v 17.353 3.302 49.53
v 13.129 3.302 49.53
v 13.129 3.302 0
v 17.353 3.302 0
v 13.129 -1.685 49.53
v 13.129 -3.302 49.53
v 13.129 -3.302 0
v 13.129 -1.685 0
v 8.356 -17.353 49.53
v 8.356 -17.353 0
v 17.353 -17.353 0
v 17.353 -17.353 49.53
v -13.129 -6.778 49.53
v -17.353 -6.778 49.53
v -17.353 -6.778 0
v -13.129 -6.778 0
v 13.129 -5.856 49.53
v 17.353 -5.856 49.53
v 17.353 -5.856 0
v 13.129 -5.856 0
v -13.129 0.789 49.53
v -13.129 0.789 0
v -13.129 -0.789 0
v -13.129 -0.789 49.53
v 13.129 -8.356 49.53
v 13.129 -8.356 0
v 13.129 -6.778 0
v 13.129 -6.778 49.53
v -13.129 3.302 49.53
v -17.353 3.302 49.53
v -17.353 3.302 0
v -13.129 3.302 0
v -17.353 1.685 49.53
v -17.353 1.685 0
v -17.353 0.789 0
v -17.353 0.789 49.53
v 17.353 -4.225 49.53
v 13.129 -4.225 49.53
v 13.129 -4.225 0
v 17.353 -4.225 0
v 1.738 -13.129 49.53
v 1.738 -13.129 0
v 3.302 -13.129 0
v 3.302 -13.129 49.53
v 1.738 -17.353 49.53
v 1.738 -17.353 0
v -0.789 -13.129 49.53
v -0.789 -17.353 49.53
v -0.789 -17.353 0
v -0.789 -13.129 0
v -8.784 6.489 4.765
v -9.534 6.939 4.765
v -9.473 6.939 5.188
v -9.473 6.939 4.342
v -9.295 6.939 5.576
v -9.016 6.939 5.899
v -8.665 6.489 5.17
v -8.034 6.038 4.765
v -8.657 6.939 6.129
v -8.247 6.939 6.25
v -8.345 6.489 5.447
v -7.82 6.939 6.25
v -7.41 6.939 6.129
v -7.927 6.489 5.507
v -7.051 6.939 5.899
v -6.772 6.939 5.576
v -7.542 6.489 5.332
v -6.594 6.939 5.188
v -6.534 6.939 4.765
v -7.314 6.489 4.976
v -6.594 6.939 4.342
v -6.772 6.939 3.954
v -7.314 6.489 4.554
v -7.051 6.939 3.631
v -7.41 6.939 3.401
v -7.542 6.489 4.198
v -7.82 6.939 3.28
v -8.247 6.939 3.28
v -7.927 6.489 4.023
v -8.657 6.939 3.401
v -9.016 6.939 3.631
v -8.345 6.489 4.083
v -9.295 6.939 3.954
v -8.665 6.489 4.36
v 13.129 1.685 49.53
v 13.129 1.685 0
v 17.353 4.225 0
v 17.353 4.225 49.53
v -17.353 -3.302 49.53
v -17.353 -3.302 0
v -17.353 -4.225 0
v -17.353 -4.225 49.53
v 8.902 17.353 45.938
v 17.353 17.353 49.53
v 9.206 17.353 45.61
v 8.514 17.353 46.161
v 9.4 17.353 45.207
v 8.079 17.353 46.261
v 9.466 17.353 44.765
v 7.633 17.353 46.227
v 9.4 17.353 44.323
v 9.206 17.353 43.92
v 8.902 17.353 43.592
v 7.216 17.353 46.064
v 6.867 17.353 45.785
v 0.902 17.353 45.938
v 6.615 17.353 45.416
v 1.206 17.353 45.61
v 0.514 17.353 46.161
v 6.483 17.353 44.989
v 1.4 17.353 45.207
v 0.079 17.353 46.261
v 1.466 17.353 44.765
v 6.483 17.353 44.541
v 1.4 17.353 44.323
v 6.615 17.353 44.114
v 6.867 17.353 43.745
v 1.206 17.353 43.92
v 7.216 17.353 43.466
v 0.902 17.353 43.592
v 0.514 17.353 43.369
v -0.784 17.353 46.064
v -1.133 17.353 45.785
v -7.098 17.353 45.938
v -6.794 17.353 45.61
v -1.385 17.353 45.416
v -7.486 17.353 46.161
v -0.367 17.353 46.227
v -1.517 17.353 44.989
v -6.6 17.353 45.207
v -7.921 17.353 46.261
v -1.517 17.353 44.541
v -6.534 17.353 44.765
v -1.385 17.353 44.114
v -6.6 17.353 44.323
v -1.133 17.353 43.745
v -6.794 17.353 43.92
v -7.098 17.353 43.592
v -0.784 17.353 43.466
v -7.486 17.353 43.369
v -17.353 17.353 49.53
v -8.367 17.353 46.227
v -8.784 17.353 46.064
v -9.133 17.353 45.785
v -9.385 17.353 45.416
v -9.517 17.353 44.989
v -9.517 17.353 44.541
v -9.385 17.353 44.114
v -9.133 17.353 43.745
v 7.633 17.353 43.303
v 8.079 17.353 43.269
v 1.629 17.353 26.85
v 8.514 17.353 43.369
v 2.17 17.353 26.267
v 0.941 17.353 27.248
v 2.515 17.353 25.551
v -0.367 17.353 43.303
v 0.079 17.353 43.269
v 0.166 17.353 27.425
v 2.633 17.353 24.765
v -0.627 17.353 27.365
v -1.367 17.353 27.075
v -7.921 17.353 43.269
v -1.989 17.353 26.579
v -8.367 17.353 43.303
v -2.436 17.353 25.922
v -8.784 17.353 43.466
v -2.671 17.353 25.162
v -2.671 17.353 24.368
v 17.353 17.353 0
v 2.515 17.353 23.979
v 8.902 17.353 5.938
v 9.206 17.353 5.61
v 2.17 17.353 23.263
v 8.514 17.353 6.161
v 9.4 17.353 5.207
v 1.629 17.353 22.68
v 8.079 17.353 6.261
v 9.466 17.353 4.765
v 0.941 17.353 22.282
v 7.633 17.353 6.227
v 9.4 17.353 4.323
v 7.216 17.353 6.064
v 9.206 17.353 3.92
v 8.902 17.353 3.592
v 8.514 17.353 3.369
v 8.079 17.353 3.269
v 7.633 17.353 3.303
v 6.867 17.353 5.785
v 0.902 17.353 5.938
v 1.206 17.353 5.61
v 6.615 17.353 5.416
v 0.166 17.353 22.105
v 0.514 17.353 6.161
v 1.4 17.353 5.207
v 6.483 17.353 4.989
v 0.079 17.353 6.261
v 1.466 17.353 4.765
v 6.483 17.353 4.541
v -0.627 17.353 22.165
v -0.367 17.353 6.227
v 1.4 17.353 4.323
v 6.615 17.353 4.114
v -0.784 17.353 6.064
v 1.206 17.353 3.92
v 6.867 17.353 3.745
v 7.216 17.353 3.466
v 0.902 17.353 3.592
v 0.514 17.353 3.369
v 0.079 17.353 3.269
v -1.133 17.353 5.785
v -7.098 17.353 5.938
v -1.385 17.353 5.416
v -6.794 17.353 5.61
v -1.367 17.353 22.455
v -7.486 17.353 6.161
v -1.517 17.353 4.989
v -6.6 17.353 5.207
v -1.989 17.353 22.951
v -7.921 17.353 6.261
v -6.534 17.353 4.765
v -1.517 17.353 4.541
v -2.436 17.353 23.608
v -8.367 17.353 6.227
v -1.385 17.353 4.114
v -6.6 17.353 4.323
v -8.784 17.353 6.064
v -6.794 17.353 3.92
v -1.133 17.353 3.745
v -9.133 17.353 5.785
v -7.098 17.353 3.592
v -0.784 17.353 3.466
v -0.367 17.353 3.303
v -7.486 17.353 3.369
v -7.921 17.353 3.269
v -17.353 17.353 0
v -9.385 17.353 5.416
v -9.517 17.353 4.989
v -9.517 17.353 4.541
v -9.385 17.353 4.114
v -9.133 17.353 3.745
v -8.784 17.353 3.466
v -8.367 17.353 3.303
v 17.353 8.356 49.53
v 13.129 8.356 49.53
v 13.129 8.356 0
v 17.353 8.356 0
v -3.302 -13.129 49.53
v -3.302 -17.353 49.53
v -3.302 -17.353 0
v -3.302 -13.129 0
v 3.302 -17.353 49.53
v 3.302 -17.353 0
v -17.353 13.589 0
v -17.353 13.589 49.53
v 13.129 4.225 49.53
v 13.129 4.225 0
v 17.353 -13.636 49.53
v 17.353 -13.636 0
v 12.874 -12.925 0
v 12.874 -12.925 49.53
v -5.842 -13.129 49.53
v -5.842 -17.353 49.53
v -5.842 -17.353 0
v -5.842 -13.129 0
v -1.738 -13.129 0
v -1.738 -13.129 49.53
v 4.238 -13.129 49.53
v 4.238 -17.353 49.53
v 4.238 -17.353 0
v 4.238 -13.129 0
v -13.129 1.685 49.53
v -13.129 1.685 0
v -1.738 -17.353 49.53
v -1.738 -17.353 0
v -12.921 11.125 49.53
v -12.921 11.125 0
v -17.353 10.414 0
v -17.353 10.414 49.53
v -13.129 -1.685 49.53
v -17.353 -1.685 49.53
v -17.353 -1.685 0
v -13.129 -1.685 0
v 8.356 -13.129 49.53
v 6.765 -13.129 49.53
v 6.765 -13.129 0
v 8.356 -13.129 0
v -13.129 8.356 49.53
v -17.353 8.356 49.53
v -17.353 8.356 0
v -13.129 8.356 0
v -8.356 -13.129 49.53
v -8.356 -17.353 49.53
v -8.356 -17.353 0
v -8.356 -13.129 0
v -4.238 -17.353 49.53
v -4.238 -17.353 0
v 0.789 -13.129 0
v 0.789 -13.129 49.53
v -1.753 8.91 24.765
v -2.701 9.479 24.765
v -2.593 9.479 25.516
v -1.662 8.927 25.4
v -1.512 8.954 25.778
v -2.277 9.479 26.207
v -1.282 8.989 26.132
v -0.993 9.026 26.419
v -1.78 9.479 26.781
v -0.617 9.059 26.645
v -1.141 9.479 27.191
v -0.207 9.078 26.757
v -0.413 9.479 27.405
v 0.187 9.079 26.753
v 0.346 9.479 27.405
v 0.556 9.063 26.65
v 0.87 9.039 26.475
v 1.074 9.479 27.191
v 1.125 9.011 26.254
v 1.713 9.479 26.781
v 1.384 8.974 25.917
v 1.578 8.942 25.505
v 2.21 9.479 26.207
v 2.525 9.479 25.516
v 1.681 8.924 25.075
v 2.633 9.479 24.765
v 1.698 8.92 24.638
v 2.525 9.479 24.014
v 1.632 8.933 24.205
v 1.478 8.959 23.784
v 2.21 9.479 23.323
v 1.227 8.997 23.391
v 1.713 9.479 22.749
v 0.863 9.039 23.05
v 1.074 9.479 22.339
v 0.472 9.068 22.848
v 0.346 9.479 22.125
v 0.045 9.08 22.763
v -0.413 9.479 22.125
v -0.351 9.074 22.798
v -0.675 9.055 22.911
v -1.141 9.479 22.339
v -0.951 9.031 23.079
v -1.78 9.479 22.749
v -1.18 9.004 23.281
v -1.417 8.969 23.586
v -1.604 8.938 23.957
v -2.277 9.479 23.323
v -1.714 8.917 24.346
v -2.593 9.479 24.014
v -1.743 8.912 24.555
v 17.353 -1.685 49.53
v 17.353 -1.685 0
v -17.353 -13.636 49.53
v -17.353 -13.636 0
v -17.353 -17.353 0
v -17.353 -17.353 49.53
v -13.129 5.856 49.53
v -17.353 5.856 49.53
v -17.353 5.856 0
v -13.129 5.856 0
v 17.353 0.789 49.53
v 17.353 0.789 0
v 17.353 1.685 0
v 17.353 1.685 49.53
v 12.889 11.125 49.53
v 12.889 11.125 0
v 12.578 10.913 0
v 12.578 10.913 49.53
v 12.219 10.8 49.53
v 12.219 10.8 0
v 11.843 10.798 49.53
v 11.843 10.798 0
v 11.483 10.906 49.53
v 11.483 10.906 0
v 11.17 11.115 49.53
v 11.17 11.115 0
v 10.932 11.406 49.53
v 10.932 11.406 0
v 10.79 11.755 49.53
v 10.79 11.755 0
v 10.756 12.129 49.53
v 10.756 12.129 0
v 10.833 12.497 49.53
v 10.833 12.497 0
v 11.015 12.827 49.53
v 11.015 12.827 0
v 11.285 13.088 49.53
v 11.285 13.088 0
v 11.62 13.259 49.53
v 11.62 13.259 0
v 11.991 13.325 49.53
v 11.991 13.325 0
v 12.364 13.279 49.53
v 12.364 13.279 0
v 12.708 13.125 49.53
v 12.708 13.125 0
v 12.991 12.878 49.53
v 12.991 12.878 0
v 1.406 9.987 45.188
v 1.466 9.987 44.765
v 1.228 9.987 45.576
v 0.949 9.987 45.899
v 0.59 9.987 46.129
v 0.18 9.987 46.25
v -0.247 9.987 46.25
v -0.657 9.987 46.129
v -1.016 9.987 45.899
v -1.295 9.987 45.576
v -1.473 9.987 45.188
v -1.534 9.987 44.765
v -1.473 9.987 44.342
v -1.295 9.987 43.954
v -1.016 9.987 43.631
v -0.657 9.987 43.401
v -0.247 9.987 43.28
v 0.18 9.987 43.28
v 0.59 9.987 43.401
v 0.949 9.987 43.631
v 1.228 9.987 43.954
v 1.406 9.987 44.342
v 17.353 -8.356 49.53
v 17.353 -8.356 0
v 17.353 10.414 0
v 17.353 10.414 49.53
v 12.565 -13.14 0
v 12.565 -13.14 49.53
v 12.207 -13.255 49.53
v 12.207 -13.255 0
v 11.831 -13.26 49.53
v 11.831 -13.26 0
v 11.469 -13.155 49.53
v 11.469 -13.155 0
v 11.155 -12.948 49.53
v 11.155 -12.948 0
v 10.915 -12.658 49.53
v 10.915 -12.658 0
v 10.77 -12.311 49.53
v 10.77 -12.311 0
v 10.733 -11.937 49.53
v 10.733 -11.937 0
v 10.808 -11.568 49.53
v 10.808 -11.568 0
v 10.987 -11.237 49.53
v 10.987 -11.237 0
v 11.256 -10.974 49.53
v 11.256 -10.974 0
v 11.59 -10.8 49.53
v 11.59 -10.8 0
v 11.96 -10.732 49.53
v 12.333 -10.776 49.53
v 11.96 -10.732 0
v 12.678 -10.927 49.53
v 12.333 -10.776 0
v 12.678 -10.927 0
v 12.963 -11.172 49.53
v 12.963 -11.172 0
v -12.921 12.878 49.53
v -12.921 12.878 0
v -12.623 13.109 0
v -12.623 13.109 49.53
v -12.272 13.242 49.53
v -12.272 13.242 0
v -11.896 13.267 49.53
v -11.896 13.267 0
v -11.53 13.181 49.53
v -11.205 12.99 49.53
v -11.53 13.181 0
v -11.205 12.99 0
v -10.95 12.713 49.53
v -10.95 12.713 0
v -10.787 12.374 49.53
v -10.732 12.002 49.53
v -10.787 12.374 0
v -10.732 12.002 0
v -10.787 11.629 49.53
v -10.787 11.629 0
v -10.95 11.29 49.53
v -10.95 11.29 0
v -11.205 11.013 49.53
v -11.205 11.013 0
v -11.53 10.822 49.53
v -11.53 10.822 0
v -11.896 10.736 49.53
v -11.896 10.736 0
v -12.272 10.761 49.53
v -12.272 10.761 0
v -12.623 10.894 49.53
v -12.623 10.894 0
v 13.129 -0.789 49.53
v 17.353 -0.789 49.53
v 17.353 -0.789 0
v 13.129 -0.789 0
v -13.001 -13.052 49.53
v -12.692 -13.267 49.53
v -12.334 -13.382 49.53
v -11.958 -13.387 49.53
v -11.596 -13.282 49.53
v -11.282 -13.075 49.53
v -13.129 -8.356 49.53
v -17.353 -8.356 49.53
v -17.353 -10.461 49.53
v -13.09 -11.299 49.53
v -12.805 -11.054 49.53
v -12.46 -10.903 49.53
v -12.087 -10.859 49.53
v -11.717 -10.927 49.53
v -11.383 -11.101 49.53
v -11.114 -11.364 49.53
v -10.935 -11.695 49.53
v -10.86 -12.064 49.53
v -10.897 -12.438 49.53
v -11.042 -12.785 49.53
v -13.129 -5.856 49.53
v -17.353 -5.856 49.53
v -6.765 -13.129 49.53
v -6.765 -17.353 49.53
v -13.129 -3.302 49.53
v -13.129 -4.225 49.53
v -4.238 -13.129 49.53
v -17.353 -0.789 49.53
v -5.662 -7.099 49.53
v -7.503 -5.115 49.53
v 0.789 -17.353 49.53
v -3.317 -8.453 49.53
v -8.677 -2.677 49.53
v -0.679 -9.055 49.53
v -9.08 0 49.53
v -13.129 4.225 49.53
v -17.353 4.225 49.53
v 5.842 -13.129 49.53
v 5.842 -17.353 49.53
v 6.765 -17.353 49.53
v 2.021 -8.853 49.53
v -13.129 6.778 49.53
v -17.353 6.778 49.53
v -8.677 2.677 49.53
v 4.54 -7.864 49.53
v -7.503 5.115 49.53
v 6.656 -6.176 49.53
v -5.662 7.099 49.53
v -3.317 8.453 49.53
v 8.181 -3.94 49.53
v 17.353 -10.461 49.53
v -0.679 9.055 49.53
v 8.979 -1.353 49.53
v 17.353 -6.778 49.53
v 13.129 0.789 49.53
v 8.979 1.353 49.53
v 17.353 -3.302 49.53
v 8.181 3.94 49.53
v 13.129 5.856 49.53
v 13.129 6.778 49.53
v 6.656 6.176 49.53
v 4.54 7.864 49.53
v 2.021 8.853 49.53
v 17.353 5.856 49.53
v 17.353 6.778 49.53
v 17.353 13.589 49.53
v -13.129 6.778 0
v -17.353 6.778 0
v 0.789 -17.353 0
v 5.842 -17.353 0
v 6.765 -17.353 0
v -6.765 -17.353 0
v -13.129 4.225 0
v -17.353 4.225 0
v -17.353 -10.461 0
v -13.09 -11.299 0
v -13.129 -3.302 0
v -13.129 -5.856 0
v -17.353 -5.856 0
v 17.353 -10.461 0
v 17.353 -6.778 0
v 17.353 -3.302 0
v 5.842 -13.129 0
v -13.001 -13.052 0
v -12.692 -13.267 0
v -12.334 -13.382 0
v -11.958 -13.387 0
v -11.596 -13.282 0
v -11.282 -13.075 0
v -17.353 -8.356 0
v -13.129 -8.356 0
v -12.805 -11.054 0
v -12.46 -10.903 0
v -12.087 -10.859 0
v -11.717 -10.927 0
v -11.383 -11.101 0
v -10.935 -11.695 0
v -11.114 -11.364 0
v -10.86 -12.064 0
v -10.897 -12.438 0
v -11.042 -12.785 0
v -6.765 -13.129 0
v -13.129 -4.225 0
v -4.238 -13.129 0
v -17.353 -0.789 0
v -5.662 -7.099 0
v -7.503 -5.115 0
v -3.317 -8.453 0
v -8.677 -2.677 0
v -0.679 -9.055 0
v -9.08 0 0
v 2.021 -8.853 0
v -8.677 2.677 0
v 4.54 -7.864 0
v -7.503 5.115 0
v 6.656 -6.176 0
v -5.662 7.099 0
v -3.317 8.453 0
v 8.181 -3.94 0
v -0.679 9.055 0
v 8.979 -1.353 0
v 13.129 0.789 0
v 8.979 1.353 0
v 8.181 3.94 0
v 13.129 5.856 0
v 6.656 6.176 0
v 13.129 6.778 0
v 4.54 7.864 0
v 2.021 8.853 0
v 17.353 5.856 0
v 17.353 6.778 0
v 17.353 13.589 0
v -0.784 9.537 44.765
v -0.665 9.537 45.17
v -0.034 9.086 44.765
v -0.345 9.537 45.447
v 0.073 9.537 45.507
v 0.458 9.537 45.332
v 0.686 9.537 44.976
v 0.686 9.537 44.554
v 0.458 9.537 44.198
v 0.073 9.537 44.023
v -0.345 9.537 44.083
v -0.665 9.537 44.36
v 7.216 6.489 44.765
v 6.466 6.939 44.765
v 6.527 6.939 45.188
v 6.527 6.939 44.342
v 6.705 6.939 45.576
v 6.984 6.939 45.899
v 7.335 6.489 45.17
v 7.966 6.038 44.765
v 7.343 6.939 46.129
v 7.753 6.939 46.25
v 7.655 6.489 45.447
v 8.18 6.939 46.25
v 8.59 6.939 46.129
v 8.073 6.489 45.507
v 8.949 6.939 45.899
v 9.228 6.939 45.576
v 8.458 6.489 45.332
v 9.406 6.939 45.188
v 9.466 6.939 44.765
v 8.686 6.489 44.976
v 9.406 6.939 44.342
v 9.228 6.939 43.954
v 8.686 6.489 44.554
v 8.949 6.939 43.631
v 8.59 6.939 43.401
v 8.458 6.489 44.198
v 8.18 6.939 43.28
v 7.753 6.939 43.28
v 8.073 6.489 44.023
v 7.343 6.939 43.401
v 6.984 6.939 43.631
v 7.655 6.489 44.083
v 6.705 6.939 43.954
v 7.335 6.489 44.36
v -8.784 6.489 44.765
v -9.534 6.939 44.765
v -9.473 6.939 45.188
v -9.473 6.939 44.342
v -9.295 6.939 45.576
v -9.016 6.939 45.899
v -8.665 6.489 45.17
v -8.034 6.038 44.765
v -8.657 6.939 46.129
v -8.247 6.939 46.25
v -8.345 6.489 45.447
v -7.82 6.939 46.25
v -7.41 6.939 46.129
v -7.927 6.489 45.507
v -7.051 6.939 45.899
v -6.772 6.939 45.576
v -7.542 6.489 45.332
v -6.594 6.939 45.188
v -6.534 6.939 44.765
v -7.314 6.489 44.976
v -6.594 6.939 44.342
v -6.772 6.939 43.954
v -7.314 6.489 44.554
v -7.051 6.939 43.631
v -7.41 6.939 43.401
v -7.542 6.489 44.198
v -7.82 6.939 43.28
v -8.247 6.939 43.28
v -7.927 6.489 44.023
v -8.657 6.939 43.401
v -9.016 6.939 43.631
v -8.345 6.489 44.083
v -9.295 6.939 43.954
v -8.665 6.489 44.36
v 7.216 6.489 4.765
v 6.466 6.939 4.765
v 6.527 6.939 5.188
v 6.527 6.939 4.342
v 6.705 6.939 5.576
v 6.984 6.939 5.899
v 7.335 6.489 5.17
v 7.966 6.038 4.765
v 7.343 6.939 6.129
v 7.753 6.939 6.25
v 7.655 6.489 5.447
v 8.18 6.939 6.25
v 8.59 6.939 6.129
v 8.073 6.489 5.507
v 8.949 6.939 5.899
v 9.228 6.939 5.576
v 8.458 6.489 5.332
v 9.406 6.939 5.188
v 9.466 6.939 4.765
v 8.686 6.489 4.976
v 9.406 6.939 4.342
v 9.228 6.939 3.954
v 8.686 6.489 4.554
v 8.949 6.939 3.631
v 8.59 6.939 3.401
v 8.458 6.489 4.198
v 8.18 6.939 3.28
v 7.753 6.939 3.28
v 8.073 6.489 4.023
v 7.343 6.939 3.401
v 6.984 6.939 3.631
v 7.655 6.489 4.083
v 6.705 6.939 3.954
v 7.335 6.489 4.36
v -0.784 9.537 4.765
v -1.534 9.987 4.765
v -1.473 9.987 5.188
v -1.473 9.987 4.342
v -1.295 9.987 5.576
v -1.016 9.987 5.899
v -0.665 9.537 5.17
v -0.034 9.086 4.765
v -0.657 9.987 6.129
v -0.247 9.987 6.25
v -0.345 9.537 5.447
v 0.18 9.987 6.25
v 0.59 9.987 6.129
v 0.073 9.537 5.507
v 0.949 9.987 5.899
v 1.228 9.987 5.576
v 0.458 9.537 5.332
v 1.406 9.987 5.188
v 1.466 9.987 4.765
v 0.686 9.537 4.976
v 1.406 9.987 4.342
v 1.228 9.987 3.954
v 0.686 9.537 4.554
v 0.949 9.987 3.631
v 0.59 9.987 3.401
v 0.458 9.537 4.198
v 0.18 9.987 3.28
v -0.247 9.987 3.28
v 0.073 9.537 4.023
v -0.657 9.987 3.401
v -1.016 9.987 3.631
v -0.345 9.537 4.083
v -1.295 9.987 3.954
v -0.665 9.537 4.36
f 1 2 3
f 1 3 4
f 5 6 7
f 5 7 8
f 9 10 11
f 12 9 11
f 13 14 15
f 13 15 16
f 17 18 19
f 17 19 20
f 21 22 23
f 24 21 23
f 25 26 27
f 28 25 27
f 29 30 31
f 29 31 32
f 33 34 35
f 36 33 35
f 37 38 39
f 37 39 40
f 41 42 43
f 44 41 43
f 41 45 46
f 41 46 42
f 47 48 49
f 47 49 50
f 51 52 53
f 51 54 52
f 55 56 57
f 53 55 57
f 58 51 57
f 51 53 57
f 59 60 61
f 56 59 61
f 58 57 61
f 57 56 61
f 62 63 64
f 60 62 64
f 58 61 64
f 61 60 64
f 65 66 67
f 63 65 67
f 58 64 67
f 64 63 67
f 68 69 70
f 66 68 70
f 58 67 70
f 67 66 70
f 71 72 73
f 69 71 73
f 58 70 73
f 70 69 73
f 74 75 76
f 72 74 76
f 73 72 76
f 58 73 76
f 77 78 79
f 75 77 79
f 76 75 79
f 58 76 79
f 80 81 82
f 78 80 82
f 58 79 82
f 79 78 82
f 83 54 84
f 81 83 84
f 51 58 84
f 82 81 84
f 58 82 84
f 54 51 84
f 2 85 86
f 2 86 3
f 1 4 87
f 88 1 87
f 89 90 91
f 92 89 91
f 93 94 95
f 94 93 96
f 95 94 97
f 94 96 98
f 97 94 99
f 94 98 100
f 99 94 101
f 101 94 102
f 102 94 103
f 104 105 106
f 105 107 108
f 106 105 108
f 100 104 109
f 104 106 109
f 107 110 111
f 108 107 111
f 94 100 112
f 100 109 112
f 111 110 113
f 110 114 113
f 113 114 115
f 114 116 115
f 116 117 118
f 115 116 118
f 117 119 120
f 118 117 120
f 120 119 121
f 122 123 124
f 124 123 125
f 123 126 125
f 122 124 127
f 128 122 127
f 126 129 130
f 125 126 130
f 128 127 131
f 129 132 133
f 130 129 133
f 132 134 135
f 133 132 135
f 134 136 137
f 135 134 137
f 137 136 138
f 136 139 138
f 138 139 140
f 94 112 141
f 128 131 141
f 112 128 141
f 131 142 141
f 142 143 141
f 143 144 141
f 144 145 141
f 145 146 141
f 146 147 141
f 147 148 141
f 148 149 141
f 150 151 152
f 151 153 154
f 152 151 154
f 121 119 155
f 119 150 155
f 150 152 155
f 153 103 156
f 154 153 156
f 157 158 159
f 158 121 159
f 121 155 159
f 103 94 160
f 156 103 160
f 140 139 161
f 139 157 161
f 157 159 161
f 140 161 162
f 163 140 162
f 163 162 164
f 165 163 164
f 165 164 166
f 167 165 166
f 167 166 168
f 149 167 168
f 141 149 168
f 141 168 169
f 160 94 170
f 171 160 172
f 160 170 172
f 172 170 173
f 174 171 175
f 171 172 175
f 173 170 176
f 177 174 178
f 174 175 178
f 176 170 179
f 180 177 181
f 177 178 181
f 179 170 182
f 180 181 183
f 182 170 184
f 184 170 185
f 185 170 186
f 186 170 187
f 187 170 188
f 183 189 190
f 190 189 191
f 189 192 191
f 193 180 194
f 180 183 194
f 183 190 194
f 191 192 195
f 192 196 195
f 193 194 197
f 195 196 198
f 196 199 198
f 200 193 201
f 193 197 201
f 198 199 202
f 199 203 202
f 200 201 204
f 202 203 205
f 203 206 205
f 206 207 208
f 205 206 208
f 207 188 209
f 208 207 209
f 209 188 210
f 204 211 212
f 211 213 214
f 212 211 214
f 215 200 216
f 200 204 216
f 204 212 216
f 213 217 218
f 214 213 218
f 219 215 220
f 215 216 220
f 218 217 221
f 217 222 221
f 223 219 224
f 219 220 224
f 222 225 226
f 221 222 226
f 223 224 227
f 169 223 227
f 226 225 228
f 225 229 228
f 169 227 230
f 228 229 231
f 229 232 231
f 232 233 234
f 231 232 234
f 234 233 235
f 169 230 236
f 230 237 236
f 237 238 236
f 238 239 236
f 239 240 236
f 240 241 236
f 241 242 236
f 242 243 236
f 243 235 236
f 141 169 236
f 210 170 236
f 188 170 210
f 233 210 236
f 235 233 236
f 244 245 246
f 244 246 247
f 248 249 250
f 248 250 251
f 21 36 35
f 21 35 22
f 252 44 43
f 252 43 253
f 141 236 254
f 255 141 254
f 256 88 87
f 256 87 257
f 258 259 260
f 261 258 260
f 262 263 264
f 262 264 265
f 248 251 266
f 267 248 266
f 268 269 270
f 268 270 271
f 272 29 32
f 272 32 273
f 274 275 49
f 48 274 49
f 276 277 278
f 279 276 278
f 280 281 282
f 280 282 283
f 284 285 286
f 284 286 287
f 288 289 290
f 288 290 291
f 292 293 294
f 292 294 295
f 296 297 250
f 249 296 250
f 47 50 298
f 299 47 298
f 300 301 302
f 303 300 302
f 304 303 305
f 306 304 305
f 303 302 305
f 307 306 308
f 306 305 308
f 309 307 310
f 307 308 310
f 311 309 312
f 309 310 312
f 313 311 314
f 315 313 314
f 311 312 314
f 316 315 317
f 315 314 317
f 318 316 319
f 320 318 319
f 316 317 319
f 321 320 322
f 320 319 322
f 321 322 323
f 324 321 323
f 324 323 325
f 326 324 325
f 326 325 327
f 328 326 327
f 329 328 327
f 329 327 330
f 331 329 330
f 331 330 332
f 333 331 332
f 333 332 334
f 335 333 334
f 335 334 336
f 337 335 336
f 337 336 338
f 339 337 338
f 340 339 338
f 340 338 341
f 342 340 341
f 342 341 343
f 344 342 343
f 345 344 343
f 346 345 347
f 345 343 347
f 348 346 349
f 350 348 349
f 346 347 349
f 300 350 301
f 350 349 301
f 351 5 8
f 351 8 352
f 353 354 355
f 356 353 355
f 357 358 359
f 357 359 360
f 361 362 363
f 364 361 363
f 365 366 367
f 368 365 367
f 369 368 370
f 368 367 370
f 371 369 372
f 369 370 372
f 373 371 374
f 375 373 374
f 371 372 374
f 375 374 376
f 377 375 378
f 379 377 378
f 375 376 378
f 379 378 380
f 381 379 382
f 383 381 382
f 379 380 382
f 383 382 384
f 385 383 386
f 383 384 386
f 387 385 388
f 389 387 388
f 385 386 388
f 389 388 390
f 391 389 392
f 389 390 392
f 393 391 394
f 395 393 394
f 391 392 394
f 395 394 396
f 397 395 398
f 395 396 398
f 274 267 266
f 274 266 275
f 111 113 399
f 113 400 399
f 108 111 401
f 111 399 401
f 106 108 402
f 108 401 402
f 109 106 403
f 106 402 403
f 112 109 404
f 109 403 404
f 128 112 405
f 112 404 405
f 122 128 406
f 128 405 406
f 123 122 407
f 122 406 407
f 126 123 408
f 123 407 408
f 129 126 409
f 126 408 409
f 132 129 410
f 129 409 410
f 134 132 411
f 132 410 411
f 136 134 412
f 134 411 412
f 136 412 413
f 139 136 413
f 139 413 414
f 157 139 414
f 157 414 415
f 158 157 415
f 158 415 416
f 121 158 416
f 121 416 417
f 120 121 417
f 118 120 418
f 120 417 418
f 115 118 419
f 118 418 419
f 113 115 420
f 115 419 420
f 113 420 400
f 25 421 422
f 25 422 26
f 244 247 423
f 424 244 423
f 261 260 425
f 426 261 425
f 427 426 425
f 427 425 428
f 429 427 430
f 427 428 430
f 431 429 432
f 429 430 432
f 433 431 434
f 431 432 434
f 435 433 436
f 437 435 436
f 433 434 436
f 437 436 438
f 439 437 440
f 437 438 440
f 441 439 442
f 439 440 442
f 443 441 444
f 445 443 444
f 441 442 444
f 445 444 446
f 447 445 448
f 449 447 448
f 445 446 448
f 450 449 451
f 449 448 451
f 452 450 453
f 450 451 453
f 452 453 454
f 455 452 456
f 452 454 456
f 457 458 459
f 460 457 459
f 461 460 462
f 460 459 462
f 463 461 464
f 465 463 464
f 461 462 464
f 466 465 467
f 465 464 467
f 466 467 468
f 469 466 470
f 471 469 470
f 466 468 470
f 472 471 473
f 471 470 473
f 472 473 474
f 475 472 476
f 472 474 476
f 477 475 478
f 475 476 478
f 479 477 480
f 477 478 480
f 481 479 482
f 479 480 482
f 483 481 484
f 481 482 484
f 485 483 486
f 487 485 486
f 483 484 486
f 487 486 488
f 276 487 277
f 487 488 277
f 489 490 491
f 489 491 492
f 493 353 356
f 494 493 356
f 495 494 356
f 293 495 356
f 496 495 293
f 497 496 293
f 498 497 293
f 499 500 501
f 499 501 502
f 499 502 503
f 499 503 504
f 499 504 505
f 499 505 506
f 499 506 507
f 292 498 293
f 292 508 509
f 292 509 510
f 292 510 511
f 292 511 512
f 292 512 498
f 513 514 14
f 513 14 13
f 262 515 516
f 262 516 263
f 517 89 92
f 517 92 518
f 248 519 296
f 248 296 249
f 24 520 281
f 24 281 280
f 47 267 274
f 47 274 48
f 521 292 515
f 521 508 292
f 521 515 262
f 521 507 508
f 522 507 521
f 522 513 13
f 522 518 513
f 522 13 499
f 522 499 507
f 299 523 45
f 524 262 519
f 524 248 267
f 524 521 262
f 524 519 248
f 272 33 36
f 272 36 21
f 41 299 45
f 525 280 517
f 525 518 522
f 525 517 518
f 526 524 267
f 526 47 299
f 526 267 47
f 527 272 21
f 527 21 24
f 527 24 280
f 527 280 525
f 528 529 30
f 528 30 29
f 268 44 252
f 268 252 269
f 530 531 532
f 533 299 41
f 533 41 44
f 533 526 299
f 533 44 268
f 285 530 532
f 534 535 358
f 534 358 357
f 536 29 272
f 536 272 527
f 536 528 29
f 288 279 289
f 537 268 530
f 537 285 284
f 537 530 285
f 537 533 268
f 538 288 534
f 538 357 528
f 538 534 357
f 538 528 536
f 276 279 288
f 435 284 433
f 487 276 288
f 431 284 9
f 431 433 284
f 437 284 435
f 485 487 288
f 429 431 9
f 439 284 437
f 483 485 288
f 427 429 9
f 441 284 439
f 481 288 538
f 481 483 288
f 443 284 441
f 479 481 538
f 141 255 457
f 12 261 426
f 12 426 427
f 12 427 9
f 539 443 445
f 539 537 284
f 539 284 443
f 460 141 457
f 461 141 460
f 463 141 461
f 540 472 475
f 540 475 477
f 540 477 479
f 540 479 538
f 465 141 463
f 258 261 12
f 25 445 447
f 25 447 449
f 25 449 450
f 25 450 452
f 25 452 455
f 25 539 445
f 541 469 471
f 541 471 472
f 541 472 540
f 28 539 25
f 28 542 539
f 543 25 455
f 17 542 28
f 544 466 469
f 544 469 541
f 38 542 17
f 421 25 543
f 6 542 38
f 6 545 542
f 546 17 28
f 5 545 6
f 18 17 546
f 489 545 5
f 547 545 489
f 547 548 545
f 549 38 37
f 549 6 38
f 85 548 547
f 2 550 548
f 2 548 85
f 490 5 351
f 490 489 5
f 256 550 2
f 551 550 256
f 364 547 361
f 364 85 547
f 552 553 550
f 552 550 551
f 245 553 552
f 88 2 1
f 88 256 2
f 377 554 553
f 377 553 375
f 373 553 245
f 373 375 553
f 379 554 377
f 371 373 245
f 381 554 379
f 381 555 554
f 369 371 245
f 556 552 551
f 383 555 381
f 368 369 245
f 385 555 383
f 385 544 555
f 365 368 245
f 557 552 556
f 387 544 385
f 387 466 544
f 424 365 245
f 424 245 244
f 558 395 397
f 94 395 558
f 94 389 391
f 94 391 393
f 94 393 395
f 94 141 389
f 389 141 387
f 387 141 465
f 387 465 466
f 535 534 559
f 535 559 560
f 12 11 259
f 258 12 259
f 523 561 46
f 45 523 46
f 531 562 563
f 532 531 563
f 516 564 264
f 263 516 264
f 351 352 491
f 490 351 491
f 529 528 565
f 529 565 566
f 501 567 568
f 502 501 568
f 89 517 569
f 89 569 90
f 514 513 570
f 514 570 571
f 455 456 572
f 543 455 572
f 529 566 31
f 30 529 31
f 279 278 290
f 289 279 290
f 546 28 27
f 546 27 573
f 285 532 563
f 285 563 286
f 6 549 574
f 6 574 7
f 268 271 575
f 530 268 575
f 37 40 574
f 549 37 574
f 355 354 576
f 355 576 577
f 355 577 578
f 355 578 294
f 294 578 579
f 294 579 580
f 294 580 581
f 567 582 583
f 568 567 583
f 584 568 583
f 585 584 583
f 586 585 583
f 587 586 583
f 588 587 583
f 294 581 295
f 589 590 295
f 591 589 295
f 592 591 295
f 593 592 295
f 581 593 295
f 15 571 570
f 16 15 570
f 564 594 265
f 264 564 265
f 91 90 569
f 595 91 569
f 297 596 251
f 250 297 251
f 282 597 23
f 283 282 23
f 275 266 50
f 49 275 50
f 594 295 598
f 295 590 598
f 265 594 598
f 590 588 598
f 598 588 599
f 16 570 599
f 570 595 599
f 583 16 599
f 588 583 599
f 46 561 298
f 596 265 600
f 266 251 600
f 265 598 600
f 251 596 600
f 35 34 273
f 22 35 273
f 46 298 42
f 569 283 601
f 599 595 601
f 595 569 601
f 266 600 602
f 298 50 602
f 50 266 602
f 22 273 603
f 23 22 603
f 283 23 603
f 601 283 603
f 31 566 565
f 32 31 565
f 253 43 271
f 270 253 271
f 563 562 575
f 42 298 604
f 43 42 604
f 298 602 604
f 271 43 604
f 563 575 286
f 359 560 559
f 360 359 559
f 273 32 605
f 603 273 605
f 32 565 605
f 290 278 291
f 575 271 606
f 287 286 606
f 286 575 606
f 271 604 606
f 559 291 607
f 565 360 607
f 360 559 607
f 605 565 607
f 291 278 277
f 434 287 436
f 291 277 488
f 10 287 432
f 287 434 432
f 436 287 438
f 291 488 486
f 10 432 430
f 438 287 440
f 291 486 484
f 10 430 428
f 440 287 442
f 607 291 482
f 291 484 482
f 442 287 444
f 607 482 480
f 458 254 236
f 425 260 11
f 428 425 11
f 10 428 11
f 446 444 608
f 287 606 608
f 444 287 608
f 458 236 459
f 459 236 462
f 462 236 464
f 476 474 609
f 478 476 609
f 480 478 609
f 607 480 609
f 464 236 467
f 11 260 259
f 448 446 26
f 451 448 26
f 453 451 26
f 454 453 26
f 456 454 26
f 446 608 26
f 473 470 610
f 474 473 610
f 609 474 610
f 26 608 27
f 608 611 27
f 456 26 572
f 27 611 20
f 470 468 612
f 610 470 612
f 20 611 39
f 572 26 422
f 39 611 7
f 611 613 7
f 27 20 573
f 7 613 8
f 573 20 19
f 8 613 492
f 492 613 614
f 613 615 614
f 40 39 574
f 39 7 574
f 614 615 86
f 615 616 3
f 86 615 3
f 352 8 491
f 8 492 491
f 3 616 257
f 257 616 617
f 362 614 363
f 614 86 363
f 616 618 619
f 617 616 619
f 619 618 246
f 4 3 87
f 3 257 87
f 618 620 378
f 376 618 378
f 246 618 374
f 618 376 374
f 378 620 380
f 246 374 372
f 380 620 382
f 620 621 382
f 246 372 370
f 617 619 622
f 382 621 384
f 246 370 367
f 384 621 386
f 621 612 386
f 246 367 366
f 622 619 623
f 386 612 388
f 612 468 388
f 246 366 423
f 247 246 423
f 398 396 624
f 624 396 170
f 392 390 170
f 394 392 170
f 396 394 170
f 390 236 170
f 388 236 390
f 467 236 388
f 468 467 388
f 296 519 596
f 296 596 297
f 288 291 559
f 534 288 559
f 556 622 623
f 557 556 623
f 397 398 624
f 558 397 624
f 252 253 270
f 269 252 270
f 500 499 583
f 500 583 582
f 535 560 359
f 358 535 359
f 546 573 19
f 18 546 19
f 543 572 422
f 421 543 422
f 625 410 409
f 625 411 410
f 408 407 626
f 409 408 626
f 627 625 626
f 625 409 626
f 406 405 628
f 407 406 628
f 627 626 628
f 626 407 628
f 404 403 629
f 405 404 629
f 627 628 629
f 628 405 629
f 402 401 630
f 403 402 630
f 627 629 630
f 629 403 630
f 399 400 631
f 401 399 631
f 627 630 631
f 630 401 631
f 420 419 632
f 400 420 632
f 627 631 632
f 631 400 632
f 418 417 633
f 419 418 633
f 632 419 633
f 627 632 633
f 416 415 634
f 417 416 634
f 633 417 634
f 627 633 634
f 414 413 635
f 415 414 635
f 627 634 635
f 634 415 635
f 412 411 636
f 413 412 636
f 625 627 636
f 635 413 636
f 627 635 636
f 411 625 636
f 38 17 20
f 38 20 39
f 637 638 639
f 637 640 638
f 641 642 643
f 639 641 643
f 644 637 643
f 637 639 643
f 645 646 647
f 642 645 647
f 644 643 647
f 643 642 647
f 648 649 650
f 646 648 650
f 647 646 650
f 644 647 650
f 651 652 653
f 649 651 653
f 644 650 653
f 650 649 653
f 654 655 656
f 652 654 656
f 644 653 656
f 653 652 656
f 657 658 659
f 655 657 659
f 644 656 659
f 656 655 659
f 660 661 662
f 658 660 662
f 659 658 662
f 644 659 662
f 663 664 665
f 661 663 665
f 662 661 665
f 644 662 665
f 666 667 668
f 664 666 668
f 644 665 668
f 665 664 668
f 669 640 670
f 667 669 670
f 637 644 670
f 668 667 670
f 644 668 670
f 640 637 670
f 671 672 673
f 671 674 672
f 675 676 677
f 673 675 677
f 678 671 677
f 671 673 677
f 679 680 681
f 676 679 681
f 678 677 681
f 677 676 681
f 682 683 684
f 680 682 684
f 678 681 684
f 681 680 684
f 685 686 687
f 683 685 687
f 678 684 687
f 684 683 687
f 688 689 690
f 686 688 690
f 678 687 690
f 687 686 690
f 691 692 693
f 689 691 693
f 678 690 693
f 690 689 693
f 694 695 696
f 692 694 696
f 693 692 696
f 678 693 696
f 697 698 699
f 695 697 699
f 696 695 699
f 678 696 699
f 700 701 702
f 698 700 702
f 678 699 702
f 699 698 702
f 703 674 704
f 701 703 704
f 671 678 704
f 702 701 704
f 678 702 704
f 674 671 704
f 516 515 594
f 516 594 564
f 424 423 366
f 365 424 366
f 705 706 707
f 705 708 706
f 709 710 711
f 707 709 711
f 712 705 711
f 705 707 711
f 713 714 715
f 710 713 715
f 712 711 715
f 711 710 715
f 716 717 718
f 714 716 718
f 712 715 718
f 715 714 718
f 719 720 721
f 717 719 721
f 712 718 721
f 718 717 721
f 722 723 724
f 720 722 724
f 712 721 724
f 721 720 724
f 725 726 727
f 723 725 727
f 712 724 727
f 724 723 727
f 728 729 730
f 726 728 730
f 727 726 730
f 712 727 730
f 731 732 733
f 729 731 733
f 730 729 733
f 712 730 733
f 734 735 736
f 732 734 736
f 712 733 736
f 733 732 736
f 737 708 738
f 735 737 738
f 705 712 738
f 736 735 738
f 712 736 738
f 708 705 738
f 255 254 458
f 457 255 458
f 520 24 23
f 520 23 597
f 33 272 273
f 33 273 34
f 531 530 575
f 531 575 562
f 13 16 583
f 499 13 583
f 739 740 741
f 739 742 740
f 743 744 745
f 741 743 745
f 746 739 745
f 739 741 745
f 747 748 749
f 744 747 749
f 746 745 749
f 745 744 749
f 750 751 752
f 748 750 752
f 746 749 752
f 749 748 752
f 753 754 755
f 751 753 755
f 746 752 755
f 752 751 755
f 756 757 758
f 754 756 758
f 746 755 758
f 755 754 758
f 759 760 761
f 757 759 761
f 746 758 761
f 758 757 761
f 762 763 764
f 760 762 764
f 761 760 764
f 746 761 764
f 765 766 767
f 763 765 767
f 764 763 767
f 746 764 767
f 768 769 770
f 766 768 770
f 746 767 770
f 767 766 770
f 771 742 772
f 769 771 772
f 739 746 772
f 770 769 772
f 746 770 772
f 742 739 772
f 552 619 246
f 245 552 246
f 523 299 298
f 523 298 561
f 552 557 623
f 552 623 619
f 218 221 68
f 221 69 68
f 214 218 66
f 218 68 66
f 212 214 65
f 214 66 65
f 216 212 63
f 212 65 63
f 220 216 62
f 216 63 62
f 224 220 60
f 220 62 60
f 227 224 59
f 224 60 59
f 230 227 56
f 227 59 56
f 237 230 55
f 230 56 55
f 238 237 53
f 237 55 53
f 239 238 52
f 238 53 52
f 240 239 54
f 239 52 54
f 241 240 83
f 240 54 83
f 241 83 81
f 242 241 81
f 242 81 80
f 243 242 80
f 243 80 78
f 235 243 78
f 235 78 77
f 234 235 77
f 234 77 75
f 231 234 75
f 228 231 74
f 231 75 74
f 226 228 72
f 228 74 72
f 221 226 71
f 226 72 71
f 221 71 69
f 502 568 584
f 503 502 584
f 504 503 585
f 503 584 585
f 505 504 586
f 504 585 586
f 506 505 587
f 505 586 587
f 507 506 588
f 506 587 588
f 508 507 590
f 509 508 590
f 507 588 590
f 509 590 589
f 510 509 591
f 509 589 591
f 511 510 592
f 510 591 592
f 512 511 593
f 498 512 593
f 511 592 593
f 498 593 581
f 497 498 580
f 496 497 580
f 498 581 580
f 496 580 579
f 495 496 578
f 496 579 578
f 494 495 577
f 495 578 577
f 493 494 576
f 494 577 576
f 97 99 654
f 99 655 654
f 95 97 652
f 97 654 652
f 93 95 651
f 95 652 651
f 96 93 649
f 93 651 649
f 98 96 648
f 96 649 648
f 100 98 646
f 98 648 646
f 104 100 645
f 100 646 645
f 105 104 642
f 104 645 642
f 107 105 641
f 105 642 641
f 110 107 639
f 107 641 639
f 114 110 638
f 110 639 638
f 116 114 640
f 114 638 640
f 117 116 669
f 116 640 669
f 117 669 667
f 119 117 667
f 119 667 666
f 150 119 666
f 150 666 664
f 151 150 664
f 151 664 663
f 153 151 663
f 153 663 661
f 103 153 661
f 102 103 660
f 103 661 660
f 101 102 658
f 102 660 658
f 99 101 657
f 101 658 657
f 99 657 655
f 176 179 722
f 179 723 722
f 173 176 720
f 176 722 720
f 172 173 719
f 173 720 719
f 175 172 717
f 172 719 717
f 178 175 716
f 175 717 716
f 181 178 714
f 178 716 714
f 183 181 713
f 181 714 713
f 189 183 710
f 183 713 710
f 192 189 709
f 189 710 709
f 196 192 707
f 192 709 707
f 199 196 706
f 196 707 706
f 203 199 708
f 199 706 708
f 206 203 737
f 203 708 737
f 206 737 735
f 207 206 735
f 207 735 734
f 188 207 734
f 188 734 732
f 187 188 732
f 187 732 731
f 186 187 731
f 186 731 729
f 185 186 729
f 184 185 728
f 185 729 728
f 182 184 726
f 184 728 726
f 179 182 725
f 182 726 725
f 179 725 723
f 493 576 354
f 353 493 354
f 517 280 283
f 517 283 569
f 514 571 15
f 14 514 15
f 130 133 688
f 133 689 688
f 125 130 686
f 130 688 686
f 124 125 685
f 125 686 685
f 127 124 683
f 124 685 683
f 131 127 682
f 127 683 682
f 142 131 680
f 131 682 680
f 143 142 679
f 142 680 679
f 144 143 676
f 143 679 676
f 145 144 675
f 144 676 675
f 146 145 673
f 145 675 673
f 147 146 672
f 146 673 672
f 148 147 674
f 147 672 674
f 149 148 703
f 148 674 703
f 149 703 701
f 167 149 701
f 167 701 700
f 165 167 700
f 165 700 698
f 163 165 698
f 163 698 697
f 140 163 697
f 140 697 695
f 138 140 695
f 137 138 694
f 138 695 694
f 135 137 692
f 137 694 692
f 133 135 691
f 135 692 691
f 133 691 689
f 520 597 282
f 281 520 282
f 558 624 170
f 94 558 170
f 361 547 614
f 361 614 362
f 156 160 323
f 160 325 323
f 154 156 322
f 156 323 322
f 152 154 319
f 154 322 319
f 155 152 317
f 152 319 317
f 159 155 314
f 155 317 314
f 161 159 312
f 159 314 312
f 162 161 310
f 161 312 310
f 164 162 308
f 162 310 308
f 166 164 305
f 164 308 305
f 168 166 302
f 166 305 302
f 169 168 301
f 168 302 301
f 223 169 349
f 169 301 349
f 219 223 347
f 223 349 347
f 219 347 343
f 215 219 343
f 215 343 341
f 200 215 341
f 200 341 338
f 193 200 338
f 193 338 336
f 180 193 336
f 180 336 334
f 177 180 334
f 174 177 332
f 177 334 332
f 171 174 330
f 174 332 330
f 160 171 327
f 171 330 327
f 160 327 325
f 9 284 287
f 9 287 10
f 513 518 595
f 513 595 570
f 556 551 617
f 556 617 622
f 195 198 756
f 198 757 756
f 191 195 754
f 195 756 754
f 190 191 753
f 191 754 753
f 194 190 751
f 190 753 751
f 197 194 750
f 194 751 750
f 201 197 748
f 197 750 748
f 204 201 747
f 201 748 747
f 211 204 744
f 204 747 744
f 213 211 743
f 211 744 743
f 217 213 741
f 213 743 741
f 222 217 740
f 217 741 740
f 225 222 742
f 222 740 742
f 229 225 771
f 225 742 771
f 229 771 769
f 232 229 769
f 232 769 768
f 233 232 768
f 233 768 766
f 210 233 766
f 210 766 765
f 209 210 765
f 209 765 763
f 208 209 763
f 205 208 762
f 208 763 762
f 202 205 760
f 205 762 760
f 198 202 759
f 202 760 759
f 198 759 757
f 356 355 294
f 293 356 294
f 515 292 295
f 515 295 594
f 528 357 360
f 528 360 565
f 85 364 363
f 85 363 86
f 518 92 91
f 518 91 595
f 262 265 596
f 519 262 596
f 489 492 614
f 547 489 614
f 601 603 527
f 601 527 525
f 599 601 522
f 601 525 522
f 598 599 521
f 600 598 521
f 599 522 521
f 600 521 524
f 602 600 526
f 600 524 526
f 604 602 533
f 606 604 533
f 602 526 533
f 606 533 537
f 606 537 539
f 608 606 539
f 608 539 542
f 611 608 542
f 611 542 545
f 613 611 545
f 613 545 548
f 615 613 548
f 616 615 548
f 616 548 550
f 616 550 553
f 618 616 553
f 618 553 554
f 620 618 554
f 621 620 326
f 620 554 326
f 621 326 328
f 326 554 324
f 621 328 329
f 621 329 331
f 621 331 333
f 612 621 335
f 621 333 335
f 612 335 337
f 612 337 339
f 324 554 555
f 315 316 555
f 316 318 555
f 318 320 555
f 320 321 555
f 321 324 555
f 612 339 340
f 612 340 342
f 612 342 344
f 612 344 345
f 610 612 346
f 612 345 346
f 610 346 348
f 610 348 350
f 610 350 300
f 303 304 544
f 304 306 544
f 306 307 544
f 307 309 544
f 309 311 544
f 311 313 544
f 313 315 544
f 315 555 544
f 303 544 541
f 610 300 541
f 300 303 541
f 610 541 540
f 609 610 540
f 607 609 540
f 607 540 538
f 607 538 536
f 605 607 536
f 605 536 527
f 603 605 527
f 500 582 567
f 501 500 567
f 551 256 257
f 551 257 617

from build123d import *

# Parameters (mm, degrees)
F1_DEPTH = 49.53
F2_D     = 18.161
F4_D     = 3
F4_DEPTH = 7.366
F4_TIP   = 0.9012909285
F5_D     = 3
F5_DEPTH = 10.414
F5_TIP   = 0.9012909285
F6_D     = 5.334
F6_DEPTH = 7.874
F6_TIP   = 1.6024952709


# Not quite as in the source:
# - a feature of the source that left no trace in its solid (it failed there, or was rolled back) is left out


with BuildPart() as f1:
    # F0 (on Top) → F1 (new body)
    with BuildSketch(Plane.XY):
        with BuildLine():
            Line((-17.3533273419, -13.6358096689), (-17.3533273419, -17.3533273419))
            Line((-17.3533273419, -17.3533273419), (-8.3558009158, -17.3533273419))
            Line((-8.3558009158, -17.3533273419), (-8.3558009158, -13.1286343989))
            Line((-8.3558009158, -13.1286343989), (-6.7648564214, -13.1286343989))
            Line((-6.7648564214, -13.1286343989), (-6.7648564214, -17.3533273419))
            Line((-6.7648564214, -17.3533273419), (-5.8423760003, -17.3533273419))
            Line((-5.8423760003, -17.3533273419), (-5.8423760003, -13.1286343989))
            Line((-5.8423760003, -13.1286343989), (-4.2380622245, -13.1286343989))
            Line((-4.2380622245, -13.1286343989), (-4.2380622245, -17.3533273419))
            Line((-4.2380622245, -17.3533273419), (-3.3022125219, -17.3533273419))
            Line((-3.3022125219, -17.3533273419), (-3.3022125219, -13.1286343989))
            Line((-3.3022125219, -13.1286343989), (-1.7380065905, -13.1286343989))
            Line((-1.7380065905, -13.1286343989), (-1.7380065905, -17.3533273419))
            Line((-1.7380065905, -17.3533273419), (-0.7887876064, -17.3533273419))
            Line((-0.7887876064, -17.3533273419), (-0.7887876064, -13.1286343989))
            Line((-0.7887876064, -13.1286343989), (0.7887876064, -13.1286343989))
            Line((0.7887876064, -13.1286343989), (0.7887876064, -17.3533273419))
            Line((0.7887876064, -17.3533273419), (1.7380065905, -17.3533273419))
            Line((1.7380065905, -17.3533273419), (1.7380065905, -13.1286343989))
            Line((1.7380065905, -13.1286343989), (3.3022125219, -13.1286343989))
            Line((3.3022125219, -13.1286343989), (3.3022125219, -17.3533273419))
            Line((3.3022125219, -17.3533273419), (4.2380622245, -17.3533273419))
            Line((4.2380622245, -17.3533273419), (4.2380622245, -13.1286343989))
            Line((4.2380622245, -13.1286343989), (5.8423760003, -13.1286343989))
            Line((5.8423760003, -13.1286343989), (5.8423760003, -17.3533273419))
            Line((5.8423760003, -17.3533273419), (6.7648564214, -17.3533273419))
            Line((6.7648564214, -17.3533273419), (6.7648564214, -13.1286343989))
            Line((6.7648564214, -13.1286343989), (8.3558009158, -13.1286343989))
            Line((8.3558009158, -13.1286343989), (8.3558009158, -17.3533273419))
            Line((8.3558009158, -17.3533273419), (17.3533273419, -17.3533273419))
            Line((17.3533273419, -17.3533273419), (17.3533273419, -13.6358096689))
            Line((17.3533273419, -13.6358096689), (12.8737204648, -12.9246096689))
            ThreePointArc((12.8737204648, -12.9246096689), (10.7331515862, -11.9367520182), (12.9631890301, -11.1720096689))
            Line((12.9631890301, -11.1720096689), (17.3533273419, -10.4608096689))
            Line((17.3533273419, -10.4608096689), (17.3533273419, -8.3558009158))
            Line((17.3533273419, -8.3558009158), (13.1286343989, -8.3558009158))
            Line((13.1286343989, -8.3558009158), (13.1286343989, -6.7782257029))
            Line((13.1286343989, -6.7782257029), (17.3533273419, -6.7782257029))
            Line((17.3533273419, -6.7782257029), (17.3533273419, -5.8557452818))
            Line((17.3533273419, -5.8557452818), (13.1286343989, -5.8557452818))
            Line((13.1286343989, -5.8557452818), (13.1286343989, -4.224692943))
            Line((13.1286343989, -4.224692943), (17.3533273419, -4.224692943))
            Line((17.3533273419, -4.224692943), (17.3533273419, -3.3022125219))
            Line((17.3533273419, -3.3022125219), (13.1286343989, -3.3022125219))
            Line((13.1286343989, -3.3022125219), (13.1286343989, -1.6845294646))
            Line((13.1286343989, -1.6845294646), (17.3533273419, -1.6845294646))
            Line((17.3533273419, -1.6845294646), (17.3533273419, -0.7887876064))
            Line((17.3533273419, -0.7887876064), (13.1286343989, -0.7887876064))
            Line((13.1286343989, -0.7887876064), (13.1286343989, 0.7887876064))
            Line((13.1286343989, 0.7887876064), (17.3533273419, 0.7887876064))
            Line((17.3533273419, 0.7887876064), (17.3533273419, 1.6845294646))
            Line((17.3533273419, 1.6845294646), (13.1286343989, 1.6845294646))
            Line((13.1286343989, 1.6845294646), (13.1286343989, 3.3022125219))
            Line((13.1286343989, 3.3022125219), (17.3533273419, 3.3022125219))
            Line((17.3533273419, 3.3022125219), (17.3533273419, 4.224692943))
            Line((17.3533273419, 4.224692943), (13.1286343989, 4.224692943))
            Line((13.1286343989, 4.224692943), (13.1286343989, 5.8557452818))
            Line((13.1286343989, 5.8557452818), (17.3533273419, 5.8557452818))
            Line((17.3533273419, 5.8557452818), (17.3533273419, 6.7782257029))
            Line((17.3533273419, 6.7782257029), (13.1286343989, 6.7782257029))
            Line((13.1286343989, 6.7782257029), (13.1286343989, 8.3558009158))
            Line((13.1286343989, 8.3558009158), (17.3533273419, 8.3558009158))
            Line((17.3533273419, 8.3558009158), (17.3533273419, 10.414))
            Line((17.3533273419, 10.414), (12.8887263902, 11.1252))
            ThreePointArc((12.8887263902, 11.1252), (10.7559013561, 12.1292367927), (12.9912280955, 12.8778))
            Line((12.9912280955, 12.8778), (17.3533273419, 13.589))
            Line((17.3533273419, 13.589), (17.3533273419, 17.3533273419))
            Line((17.3533273419, 17.3533273419), (-17.3533273419, 17.3533273419))
            Line((-17.3533273419, 17.3533273419), (-17.3533273419, 13.589))
            Line((-17.3533273419, 13.589), (-12.9207378963, 12.8778))
            ThreePointArc((-12.9207378963, 12.8778), (-10.7315, 12.0015), (-12.9207378963, 11.1252))
            Line((-12.9207378963, 11.1252), (-17.3533273419, 10.414))
            Line((-17.3533273419, 10.414), (-17.3533273419, 8.3558009158))
            Line((-17.3533273419, 8.3558009158), (-13.1286343989, 8.3558009158))
            Line((-13.1286343989, 8.3558009158), (-13.1286343989, 6.7782257029))
            Line((-13.1286343989, 6.7782257029), (-17.3533273419, 6.7782257029))
            Line((-17.3533273419, 6.7782257029), (-17.3533273419, 5.8557452818))
            Line((-17.3533273419, 5.8557452818), (-13.1286343989, 5.8557452818))
            Line((-13.1286343989, 5.8557452818), (-13.1286343989, 4.224692943))
            Line((-13.1286343989, 4.224692943), (-17.3533273419, 4.224692943))
            Line((-17.3533273419, 4.224692943), (-17.3533273419, 3.3022125219))
            Line((-17.3533273419, 3.3022125219), (-13.1286343989, 3.3022125219))
            Line((-13.1286343989, 3.3022125219), (-13.1286343989, 1.6845294646))
            Line((-13.1286343989, 1.6845294646), (-17.3533273419, 1.6845294646))
            Line((-17.3533273419, 1.6845294646), (-17.3533273419, 0.7887876064))
            Line((-17.3533273419, 0.7887876064), (-13.1286343989, 0.7887876064))
            Line((-13.1286343989, 0.7887876064), (-13.1286343989, -0.7887876064))
            Line((-13.1286343989, -0.7887876064), (-17.3533273419, -0.7887876064))
            Line((-17.3533273419, -0.7887876064), (-17.3533273419, -1.6845294646))
            Line((-17.3533273419, -1.6845294646), (-13.1286343989, -1.6845294646))
            Line((-13.1286343989, -1.6845294646), (-13.1286343989, -3.3022125219))
            Line((-13.1286343989, -3.3022125219), (-17.3533273419, -3.3022125219))
            Line((-17.3533273419, -3.3022125219), (-17.3533273419, -4.224692943))
            Line((-17.3533273419, -4.224692943), (-13.1286343989, -4.224692943))
            Line((-13.1286343989, -4.224692943), (-13.1286343989, -5.8557452818))
            Line((-13.1286343989, -5.8557452818), (-17.3533273419, -5.8557452818))
            Line((-17.3533273419, -5.8557452818), (-17.3533273419, -6.7782257029))
            Line((-17.3533273419, -6.7782257029), (-13.1286343989, -6.7782257029))
            Line((-13.1286343989, -6.7782257029), (-13.1286343989, -8.3558009158))
            Line((-13.1286343989, -8.3558009158), (-17.3533273419, -8.3558009158))
            Line((-17.3533273419, -8.3558009158), (-17.3533273419, -10.4608096689))
            Line((-17.3533273419, -10.4608096689), (-13.0901890301, -11.2990096689))
            ThreePointArc((-13.0901890301, -11.2990096689), (-10.8601515862, -12.0637520182), (-13.0007204648, -13.0516096689))
            Line((-13.0007204648, -13.0516096689), (-17.3533273419, -13.6358096689))
        make_face()
    extrude(amount=F1_DEPTH)

    # F2 (through all)
    with Locations(Plane(origin=(0, 0, 0), x_dir=(1, 0, 0), z_dir=(0, 0, -1))):
        with Locations((0, 0)):
            Hole(F2_D / 2)

    # F4
    with Locations(Plane(origin=(0, 17.3533273419, 0), x_dir=(-1, 0, 0), z_dir=(0, 1, 0))):
        with Locations((0.033583874, 44.765), (0.033583874, 4.765)):
            Hole(F4_D / 2, depth=F4_DEPTH)
            with Locations((0, 0, -(F4_DEPTH + F4_TIP / 2))):  # 118° drill point
                Cone(0, F4_D / 2, F4_TIP, mode=Mode.SUBTRACT)

    # F5
    with Locations(Plane(origin=(0, 17.3533273419, 0), x_dir=(-1, 0, 0), z_dir=(0, 1, 0))):
        with Locations((8.033583874, 44.765), (8.033583874, 4.765), (-7.966416126, 4.765), (-7.966416126, 44.765)):
            Hole(F5_D / 2, depth=F5_DEPTH)
            with Locations((0, 0, -(F5_DEPTH + F5_TIP / 2))):  # 118° drill point
                Cone(0, F5_D / 2, F5_TIP, mode=Mode.SUBTRACT)

    # F6
    with Locations(Plane(origin=(0, 17.3533273419, 0), x_dir=(-1, 0, 0), z_dir=(0, 1, 0))):
        with Locations((0.033583874, 24.765)):
            Hole(F6_D / 2, depth=F6_DEPTH)
            with Locations((0, 0, -(F6_DEPTH + F6_TIP / 2))):  # 118° drill point
                Cone(0, F6_D / 2, F6_TIP, mode=Mode.SUBTRACT)


solid = f1.part
